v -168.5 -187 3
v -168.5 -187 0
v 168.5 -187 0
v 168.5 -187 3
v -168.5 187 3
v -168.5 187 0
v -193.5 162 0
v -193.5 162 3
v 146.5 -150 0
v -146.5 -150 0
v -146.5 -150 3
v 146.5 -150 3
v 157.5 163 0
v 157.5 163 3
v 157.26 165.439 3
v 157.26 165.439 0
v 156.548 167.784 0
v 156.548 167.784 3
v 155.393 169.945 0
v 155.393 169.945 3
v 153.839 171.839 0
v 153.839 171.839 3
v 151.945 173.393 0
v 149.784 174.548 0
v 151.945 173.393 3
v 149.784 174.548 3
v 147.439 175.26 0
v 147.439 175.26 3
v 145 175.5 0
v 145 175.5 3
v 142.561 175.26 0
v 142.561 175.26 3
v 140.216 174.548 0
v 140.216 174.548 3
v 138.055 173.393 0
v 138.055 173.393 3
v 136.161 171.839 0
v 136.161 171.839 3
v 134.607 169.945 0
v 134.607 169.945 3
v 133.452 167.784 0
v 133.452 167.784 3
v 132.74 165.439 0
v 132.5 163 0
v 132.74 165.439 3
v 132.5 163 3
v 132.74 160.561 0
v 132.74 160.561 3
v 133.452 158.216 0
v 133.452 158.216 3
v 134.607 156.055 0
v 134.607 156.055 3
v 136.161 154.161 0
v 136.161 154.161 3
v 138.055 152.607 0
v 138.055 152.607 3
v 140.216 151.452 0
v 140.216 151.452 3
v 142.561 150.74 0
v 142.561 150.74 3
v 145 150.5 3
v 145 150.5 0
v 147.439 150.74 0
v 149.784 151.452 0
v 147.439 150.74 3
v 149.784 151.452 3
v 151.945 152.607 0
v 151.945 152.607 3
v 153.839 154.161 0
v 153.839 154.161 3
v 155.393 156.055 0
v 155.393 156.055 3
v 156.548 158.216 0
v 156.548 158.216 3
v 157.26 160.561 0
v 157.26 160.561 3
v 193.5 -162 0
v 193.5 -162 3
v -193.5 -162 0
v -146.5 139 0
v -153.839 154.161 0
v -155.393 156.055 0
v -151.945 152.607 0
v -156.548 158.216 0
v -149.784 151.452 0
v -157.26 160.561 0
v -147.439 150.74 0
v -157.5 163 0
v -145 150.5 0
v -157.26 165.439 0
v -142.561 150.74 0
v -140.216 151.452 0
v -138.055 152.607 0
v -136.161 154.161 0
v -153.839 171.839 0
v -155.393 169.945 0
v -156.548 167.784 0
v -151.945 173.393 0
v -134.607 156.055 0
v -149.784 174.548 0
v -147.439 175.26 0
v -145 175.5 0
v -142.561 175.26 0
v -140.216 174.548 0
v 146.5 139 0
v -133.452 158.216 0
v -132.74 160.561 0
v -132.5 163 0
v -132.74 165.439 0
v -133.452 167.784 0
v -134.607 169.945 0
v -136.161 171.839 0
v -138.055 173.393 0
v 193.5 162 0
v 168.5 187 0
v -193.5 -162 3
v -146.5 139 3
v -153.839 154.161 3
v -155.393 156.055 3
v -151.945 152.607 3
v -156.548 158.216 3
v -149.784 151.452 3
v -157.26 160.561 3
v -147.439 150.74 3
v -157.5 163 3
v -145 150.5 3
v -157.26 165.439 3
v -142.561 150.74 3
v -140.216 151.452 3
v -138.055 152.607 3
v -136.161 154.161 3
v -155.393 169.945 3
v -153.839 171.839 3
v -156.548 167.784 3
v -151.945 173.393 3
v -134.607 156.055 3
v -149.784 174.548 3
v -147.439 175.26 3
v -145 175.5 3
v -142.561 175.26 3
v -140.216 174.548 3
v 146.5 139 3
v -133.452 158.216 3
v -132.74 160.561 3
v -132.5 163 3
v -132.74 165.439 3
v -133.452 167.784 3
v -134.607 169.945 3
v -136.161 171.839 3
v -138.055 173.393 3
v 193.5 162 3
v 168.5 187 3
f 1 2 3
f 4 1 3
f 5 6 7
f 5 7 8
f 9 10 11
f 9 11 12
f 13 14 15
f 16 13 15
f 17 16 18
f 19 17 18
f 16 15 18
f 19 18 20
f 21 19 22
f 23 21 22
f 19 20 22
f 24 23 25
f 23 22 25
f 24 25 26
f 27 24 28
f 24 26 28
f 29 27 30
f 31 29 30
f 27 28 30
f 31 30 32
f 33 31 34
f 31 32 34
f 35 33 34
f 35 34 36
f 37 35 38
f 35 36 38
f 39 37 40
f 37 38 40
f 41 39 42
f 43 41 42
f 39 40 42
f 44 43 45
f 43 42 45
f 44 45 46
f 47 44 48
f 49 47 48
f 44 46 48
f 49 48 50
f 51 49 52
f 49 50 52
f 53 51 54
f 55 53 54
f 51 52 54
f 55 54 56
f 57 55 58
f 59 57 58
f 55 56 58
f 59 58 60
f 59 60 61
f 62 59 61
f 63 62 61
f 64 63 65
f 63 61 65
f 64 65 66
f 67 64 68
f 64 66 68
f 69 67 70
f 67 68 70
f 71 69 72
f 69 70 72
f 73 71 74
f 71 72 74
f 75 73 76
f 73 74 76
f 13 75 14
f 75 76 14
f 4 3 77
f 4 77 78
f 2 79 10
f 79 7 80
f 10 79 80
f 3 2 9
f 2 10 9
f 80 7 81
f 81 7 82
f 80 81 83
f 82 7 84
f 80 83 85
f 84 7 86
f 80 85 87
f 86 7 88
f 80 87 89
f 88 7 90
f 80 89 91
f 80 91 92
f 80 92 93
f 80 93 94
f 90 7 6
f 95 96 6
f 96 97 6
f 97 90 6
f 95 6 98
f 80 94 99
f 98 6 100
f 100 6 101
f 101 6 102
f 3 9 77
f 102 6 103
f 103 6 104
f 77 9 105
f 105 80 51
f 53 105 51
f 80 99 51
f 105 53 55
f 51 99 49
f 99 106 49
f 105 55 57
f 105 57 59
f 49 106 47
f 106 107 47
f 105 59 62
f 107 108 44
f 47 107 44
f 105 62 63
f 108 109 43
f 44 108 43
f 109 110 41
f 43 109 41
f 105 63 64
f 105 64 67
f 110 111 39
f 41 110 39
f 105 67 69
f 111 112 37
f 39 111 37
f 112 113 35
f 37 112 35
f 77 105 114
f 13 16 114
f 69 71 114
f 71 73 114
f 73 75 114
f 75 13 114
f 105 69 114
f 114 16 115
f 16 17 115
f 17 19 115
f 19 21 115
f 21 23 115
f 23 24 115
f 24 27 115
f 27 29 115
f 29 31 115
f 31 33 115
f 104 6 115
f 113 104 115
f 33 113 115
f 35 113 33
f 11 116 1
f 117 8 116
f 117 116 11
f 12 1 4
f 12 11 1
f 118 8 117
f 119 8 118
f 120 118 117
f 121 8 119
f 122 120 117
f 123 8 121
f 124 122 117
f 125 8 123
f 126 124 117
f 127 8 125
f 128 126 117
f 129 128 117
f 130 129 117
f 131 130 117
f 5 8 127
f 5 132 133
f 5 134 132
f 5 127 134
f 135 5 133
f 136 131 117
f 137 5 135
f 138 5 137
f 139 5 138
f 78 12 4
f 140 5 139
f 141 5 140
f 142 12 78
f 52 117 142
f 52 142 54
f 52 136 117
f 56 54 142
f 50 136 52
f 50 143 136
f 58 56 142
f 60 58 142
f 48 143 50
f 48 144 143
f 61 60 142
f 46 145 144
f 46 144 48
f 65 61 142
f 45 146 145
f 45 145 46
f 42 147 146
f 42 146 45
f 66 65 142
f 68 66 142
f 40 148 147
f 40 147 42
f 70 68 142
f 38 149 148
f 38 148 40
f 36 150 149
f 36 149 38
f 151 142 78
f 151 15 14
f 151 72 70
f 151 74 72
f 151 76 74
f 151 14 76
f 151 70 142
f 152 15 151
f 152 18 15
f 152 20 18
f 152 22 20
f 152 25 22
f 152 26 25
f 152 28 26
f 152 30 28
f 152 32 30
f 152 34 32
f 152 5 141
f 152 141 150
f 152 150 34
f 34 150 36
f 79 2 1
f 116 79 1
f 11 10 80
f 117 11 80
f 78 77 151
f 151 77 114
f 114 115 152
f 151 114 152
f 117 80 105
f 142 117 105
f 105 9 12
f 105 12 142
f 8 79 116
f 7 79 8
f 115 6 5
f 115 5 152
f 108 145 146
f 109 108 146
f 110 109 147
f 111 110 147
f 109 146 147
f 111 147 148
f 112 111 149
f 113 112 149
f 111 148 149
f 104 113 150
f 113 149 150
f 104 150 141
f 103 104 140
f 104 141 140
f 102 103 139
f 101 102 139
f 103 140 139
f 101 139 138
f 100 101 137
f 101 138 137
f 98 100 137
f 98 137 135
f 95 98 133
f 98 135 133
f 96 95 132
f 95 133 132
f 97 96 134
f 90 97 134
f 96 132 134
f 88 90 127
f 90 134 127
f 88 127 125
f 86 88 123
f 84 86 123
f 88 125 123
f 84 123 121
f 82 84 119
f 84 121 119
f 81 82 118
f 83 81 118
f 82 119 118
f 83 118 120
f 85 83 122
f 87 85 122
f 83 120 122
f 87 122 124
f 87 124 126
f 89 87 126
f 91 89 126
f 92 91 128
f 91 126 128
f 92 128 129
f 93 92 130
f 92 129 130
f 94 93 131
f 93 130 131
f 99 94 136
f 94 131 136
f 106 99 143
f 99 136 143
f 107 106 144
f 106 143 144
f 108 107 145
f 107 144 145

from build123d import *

# Parameters (mm, degrees)
ESQUISSE1_W             = 387
ESQUISSE1_H             = 374
ESQUISSE1_W_2           = 293
ESQUISSE1_H_2           = 289
BOSS_EXTRU_1_DEPTH      = 3
CHANFREIN1_SIZE         = 25
ESQUISSE2_R             = 12.5
ENL_V_MAT_EXTRU_1_DEPTH = 3


with BuildPart() as part:
    # Esquisse1 → Boss.-Extru.1 (new body)
    with BuildSketch(Plane.XY):
        Rectangle(ESQUISSE1_W, ESQUISSE1_H)
        with Locations((0, -5.5)):
            Rectangle(ESQUISSE1_W_2, ESQUISSE1_H_2, mode=Mode.SUBTRACT)
    extrude(amount=BOSS_EXTRU_1_DEPTH)

    # Chanfrein1
    chanfrein1_edges = [part.edges().sort_by_distance(p)[0] for p in [
        (193.5, -187, 1.5),
        (-193.5, -187, 1.5),
        (-193.5, 187, 1.5),
        (193.5, 187, 1.5),
    ]]
    chamfer(chanfrein1_edges, length=CHANFREIN1_SIZE)

    # Esquisse2 → Enlèv. mat.-Extru.1 (cut)
    with BuildSketch(Plane.XY.offset(3)):
        with Locations((145, 163)):
            Circle(ESQUISSE2_R)
        with Locations((-145, 163)):
            Circle(ESQUISSE2_R)
    extrude(amount=-ENL_V_MAT_EXTRU_1_DEPTH, mode=Mode.SUBTRACT)


solid = part.part
